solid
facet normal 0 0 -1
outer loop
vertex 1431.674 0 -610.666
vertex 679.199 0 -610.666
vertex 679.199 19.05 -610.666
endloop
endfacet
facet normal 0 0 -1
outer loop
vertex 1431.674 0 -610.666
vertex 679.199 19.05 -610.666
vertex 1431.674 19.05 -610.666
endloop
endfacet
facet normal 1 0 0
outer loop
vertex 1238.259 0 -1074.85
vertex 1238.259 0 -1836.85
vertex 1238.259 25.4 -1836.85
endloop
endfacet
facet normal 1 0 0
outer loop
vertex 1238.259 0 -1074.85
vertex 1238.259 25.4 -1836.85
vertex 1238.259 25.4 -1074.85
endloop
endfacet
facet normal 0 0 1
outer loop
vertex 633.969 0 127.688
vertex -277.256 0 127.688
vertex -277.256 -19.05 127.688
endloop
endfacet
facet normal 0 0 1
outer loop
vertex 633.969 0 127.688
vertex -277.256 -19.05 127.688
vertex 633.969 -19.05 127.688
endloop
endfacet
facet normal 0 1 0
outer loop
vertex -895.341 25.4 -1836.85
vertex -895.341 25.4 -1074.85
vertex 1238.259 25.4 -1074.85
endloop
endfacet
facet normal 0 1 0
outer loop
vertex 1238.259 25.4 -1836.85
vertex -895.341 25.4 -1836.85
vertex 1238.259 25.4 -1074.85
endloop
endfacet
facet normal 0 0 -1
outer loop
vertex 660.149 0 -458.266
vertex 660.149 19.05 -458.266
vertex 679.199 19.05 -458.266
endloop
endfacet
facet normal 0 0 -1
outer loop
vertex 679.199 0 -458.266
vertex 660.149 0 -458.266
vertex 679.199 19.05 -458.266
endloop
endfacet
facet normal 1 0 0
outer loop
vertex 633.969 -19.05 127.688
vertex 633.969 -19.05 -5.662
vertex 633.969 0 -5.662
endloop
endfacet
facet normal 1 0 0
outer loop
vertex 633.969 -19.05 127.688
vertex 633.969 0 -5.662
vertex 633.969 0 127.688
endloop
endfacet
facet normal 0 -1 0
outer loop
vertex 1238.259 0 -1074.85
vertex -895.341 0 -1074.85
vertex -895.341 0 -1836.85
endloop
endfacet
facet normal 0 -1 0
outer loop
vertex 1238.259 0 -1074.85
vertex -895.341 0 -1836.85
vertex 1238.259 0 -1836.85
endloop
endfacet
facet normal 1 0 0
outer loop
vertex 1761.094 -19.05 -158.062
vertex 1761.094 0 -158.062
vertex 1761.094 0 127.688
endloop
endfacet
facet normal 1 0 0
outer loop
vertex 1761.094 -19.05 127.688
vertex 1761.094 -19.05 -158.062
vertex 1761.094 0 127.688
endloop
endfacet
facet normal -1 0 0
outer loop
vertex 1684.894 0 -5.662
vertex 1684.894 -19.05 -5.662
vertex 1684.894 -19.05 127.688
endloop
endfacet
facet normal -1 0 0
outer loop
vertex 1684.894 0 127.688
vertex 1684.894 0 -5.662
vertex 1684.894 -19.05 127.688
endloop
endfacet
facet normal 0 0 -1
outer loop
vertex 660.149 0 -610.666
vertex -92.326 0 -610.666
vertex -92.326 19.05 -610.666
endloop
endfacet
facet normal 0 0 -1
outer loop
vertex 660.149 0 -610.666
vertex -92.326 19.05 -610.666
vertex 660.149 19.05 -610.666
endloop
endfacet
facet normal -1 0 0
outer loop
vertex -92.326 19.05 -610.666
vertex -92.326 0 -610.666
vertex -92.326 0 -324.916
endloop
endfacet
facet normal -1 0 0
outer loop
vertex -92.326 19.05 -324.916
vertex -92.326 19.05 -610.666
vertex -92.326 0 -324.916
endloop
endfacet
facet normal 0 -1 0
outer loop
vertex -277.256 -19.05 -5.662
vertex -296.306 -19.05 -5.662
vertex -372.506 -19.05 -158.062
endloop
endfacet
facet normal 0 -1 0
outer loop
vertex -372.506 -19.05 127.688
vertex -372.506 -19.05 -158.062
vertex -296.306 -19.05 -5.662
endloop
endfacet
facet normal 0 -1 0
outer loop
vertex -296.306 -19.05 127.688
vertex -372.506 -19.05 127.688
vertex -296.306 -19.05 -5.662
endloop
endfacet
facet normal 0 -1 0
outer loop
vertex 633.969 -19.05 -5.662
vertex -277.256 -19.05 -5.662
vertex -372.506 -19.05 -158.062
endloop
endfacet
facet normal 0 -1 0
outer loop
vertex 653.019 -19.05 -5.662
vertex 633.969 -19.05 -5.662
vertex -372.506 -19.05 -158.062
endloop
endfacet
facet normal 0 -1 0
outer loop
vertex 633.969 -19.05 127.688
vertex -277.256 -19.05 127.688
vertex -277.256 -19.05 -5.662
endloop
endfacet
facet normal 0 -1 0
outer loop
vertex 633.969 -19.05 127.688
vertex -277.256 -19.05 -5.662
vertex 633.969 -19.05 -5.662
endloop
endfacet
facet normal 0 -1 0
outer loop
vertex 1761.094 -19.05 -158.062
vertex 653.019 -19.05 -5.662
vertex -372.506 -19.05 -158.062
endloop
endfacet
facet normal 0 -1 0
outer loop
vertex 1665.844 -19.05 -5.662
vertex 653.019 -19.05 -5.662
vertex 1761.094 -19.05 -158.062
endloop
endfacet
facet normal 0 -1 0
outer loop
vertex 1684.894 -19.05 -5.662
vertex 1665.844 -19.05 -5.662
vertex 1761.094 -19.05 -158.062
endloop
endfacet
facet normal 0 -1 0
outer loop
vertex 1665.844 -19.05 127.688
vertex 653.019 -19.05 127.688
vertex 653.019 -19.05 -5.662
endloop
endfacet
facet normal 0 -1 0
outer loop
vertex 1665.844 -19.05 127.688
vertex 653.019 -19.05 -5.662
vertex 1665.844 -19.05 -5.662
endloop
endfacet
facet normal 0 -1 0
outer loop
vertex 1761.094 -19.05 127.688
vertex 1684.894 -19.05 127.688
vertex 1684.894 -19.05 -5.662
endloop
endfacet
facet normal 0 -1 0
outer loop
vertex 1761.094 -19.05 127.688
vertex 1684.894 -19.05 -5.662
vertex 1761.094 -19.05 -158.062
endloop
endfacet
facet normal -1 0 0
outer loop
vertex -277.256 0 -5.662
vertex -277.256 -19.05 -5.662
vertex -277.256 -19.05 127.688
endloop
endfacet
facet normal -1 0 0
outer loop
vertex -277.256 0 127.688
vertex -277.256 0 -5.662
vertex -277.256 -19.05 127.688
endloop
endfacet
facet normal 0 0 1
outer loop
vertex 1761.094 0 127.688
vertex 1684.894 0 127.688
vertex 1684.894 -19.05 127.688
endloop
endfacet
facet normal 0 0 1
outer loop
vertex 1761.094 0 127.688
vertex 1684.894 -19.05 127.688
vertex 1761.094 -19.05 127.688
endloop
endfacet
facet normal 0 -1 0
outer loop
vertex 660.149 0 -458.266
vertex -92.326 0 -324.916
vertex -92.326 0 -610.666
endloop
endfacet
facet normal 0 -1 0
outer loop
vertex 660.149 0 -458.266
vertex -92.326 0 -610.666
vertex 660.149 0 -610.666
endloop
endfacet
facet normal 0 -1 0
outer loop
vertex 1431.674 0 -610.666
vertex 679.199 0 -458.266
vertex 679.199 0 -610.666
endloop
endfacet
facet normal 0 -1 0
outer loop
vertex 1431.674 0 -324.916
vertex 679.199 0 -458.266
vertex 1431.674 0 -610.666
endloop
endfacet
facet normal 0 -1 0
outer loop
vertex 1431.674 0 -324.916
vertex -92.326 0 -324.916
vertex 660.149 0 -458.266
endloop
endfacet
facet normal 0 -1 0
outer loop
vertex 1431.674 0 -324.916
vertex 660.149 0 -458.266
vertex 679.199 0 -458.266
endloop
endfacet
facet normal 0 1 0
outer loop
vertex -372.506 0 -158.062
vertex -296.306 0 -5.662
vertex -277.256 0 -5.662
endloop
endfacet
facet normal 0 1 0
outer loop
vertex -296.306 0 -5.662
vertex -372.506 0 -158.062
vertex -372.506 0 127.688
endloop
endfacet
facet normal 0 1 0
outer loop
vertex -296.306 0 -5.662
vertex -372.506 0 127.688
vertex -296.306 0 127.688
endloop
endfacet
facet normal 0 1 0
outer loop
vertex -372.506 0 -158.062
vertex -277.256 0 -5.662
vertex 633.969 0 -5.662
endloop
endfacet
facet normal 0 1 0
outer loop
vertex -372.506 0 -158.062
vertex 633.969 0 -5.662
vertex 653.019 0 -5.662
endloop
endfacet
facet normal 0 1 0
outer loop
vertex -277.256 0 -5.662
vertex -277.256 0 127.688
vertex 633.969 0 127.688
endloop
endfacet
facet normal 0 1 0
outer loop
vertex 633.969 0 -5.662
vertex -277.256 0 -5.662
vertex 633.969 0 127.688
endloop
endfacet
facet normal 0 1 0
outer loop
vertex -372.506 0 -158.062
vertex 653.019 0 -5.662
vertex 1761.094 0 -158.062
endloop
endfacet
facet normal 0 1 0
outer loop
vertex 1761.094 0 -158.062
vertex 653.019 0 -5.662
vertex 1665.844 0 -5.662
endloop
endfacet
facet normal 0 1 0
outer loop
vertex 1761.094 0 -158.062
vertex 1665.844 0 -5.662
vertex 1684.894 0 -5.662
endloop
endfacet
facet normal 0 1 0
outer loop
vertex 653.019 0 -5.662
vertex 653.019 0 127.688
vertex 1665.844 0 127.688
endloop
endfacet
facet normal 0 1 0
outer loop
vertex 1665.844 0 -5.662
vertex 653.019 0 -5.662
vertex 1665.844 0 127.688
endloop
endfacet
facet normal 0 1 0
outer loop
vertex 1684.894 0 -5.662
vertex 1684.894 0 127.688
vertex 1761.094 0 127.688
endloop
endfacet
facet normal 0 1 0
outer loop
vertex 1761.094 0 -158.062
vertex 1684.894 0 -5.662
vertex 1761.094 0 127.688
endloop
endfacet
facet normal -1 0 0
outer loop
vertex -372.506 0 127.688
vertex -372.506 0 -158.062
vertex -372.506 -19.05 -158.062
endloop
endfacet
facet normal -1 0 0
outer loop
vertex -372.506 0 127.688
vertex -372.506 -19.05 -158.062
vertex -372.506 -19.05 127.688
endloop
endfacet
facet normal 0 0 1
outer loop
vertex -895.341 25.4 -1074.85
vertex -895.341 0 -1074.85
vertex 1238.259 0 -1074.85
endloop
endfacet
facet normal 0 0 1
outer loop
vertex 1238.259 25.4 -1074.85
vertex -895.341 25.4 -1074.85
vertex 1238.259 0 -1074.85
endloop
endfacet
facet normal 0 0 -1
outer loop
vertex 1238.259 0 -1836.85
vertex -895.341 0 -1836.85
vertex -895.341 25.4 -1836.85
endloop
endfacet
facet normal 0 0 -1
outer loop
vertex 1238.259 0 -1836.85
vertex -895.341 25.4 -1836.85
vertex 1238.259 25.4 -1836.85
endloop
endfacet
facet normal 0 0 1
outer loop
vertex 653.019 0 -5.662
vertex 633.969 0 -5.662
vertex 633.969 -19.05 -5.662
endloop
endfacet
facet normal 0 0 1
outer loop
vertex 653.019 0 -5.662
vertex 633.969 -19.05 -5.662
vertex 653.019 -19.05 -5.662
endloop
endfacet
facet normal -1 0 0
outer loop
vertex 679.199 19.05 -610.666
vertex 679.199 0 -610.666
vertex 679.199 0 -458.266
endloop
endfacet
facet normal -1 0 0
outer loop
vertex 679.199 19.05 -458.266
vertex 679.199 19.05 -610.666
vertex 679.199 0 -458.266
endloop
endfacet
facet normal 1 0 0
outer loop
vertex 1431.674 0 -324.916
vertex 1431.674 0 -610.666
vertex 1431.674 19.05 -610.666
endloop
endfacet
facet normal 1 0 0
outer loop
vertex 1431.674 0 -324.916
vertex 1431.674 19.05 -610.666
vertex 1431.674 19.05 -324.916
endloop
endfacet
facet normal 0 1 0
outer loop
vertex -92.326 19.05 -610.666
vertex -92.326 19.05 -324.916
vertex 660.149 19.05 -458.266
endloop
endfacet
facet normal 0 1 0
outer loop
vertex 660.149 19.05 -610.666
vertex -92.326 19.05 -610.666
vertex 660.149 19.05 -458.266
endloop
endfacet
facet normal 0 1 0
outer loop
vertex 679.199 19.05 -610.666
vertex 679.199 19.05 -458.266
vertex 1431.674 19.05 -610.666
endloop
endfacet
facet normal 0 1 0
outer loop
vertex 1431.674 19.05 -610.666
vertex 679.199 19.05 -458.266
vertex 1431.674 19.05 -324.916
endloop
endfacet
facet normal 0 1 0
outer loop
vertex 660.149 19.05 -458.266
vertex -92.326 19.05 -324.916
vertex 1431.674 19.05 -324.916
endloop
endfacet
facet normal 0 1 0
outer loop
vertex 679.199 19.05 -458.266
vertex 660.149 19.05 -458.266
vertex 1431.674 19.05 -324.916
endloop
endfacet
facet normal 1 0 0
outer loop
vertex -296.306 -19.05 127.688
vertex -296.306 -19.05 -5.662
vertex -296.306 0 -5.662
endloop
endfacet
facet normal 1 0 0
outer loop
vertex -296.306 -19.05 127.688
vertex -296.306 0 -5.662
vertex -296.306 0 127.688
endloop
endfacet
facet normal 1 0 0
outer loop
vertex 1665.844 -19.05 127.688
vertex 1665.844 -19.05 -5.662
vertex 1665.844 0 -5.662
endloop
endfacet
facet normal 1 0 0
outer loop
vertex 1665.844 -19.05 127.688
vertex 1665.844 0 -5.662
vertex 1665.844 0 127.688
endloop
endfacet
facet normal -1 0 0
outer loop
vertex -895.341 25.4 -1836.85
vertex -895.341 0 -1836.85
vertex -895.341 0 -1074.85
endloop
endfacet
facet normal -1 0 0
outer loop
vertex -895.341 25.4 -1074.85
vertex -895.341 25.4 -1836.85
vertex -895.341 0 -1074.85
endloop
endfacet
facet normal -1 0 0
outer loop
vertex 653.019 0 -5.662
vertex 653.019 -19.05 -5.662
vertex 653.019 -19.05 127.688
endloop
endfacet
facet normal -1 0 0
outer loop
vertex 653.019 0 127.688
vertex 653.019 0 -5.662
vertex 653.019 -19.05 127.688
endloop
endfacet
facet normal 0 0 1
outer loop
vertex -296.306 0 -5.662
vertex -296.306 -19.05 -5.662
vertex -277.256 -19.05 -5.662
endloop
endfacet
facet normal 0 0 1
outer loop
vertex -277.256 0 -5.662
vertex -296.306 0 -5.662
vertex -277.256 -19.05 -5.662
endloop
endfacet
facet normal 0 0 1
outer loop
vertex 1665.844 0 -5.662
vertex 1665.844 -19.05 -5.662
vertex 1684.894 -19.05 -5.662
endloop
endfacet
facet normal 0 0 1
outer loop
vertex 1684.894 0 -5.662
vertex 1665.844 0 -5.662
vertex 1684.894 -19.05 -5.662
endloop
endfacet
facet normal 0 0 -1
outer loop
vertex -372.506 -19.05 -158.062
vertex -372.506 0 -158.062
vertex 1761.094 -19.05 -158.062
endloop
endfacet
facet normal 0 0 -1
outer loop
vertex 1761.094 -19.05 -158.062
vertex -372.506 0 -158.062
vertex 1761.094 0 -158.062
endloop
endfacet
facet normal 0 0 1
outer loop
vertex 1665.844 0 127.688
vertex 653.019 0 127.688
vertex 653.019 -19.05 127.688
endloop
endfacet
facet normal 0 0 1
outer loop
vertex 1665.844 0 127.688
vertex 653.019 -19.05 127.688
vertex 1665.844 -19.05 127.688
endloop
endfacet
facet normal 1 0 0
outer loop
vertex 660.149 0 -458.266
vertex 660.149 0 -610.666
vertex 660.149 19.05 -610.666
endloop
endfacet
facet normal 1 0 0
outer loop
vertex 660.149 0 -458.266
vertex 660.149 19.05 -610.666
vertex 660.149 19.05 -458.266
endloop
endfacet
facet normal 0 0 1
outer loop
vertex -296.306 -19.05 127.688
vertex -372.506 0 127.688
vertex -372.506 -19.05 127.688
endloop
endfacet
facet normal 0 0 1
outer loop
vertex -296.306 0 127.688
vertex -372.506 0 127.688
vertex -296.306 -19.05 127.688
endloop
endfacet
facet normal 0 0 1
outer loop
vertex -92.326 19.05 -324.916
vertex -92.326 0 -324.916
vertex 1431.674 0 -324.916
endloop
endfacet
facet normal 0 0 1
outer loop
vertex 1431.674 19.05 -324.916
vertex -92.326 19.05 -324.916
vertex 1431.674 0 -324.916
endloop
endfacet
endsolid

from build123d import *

# Parameters (mm, degrees)
F0_W     = 2133.6
F0_H     = 285.75
F1_DEPTH = 19.05
F2_W     = 19.05
F2_H     = 133.35
F3_DEPTH = 19.051
F4_W     = 1524
F4_H     = 285.75
F5_DEPTH = 19.05
F6_W     = 19.05
F6_H     = 152.4
F7_DEPTH = 19.051
F8_W     = 2133.6
F8_H     = 762
F9_DEPTH = 25.4


with BuildPart() as f1:
    # F0 (on Front) → F1 (new body)
    with BuildSketch(Plane.XZ):
        with Locations((694.29449, -15.187053)):
            Rectangle(F0_W, F0_H)
    extrude(amount=F1_DEPTH)

    # F2 (on face) → F3 (cut, through all)
    with BuildSketch(Plane.XZ.offset(19.05)):
        with Locations((643.49449, 61.012947)):
            Rectangle(F2_W, F2_H)
        with Locations((-286.78051, 61.012947)):
            Rectangle(F2_W, F2_H)
        with Locations((1675.36949, 61.012947)):
            Rectangle(F2_W, F2_H)
    extrude(amount=-F3_DEPTH, mode=Mode.SUBTRACT)


with BuildPart() as f5:
    # F4 (on Front) → F5 (new body)
    with BuildSketch(Plane.XZ):
        with Locations((669.673849, -467.79108)):
            Rectangle(F4_W, F4_H)
    extrude(amount=-F5_DEPTH)

    # F6 (on face) → F7 (cut, through all)
    with BuildSketch(Plane.XZ):
        with Locations((669.673849, -534.46608)):
            Rectangle(F6_W, F6_H)
    extrude(amount=-F7_DEPTH, mode=Mode.SUBTRACT)


with BuildPart() as f9:
    # F8 (on Front) → F9 (new body)
    with BuildSketch(Plane.XZ):
        with Locations((171.459087, -1455.850435)):
            Rectangle(F8_W, F8_H)
    extrude(amount=-F9_DEPTH)


solid = Compound([f1.part, f5.part, f9.part])
